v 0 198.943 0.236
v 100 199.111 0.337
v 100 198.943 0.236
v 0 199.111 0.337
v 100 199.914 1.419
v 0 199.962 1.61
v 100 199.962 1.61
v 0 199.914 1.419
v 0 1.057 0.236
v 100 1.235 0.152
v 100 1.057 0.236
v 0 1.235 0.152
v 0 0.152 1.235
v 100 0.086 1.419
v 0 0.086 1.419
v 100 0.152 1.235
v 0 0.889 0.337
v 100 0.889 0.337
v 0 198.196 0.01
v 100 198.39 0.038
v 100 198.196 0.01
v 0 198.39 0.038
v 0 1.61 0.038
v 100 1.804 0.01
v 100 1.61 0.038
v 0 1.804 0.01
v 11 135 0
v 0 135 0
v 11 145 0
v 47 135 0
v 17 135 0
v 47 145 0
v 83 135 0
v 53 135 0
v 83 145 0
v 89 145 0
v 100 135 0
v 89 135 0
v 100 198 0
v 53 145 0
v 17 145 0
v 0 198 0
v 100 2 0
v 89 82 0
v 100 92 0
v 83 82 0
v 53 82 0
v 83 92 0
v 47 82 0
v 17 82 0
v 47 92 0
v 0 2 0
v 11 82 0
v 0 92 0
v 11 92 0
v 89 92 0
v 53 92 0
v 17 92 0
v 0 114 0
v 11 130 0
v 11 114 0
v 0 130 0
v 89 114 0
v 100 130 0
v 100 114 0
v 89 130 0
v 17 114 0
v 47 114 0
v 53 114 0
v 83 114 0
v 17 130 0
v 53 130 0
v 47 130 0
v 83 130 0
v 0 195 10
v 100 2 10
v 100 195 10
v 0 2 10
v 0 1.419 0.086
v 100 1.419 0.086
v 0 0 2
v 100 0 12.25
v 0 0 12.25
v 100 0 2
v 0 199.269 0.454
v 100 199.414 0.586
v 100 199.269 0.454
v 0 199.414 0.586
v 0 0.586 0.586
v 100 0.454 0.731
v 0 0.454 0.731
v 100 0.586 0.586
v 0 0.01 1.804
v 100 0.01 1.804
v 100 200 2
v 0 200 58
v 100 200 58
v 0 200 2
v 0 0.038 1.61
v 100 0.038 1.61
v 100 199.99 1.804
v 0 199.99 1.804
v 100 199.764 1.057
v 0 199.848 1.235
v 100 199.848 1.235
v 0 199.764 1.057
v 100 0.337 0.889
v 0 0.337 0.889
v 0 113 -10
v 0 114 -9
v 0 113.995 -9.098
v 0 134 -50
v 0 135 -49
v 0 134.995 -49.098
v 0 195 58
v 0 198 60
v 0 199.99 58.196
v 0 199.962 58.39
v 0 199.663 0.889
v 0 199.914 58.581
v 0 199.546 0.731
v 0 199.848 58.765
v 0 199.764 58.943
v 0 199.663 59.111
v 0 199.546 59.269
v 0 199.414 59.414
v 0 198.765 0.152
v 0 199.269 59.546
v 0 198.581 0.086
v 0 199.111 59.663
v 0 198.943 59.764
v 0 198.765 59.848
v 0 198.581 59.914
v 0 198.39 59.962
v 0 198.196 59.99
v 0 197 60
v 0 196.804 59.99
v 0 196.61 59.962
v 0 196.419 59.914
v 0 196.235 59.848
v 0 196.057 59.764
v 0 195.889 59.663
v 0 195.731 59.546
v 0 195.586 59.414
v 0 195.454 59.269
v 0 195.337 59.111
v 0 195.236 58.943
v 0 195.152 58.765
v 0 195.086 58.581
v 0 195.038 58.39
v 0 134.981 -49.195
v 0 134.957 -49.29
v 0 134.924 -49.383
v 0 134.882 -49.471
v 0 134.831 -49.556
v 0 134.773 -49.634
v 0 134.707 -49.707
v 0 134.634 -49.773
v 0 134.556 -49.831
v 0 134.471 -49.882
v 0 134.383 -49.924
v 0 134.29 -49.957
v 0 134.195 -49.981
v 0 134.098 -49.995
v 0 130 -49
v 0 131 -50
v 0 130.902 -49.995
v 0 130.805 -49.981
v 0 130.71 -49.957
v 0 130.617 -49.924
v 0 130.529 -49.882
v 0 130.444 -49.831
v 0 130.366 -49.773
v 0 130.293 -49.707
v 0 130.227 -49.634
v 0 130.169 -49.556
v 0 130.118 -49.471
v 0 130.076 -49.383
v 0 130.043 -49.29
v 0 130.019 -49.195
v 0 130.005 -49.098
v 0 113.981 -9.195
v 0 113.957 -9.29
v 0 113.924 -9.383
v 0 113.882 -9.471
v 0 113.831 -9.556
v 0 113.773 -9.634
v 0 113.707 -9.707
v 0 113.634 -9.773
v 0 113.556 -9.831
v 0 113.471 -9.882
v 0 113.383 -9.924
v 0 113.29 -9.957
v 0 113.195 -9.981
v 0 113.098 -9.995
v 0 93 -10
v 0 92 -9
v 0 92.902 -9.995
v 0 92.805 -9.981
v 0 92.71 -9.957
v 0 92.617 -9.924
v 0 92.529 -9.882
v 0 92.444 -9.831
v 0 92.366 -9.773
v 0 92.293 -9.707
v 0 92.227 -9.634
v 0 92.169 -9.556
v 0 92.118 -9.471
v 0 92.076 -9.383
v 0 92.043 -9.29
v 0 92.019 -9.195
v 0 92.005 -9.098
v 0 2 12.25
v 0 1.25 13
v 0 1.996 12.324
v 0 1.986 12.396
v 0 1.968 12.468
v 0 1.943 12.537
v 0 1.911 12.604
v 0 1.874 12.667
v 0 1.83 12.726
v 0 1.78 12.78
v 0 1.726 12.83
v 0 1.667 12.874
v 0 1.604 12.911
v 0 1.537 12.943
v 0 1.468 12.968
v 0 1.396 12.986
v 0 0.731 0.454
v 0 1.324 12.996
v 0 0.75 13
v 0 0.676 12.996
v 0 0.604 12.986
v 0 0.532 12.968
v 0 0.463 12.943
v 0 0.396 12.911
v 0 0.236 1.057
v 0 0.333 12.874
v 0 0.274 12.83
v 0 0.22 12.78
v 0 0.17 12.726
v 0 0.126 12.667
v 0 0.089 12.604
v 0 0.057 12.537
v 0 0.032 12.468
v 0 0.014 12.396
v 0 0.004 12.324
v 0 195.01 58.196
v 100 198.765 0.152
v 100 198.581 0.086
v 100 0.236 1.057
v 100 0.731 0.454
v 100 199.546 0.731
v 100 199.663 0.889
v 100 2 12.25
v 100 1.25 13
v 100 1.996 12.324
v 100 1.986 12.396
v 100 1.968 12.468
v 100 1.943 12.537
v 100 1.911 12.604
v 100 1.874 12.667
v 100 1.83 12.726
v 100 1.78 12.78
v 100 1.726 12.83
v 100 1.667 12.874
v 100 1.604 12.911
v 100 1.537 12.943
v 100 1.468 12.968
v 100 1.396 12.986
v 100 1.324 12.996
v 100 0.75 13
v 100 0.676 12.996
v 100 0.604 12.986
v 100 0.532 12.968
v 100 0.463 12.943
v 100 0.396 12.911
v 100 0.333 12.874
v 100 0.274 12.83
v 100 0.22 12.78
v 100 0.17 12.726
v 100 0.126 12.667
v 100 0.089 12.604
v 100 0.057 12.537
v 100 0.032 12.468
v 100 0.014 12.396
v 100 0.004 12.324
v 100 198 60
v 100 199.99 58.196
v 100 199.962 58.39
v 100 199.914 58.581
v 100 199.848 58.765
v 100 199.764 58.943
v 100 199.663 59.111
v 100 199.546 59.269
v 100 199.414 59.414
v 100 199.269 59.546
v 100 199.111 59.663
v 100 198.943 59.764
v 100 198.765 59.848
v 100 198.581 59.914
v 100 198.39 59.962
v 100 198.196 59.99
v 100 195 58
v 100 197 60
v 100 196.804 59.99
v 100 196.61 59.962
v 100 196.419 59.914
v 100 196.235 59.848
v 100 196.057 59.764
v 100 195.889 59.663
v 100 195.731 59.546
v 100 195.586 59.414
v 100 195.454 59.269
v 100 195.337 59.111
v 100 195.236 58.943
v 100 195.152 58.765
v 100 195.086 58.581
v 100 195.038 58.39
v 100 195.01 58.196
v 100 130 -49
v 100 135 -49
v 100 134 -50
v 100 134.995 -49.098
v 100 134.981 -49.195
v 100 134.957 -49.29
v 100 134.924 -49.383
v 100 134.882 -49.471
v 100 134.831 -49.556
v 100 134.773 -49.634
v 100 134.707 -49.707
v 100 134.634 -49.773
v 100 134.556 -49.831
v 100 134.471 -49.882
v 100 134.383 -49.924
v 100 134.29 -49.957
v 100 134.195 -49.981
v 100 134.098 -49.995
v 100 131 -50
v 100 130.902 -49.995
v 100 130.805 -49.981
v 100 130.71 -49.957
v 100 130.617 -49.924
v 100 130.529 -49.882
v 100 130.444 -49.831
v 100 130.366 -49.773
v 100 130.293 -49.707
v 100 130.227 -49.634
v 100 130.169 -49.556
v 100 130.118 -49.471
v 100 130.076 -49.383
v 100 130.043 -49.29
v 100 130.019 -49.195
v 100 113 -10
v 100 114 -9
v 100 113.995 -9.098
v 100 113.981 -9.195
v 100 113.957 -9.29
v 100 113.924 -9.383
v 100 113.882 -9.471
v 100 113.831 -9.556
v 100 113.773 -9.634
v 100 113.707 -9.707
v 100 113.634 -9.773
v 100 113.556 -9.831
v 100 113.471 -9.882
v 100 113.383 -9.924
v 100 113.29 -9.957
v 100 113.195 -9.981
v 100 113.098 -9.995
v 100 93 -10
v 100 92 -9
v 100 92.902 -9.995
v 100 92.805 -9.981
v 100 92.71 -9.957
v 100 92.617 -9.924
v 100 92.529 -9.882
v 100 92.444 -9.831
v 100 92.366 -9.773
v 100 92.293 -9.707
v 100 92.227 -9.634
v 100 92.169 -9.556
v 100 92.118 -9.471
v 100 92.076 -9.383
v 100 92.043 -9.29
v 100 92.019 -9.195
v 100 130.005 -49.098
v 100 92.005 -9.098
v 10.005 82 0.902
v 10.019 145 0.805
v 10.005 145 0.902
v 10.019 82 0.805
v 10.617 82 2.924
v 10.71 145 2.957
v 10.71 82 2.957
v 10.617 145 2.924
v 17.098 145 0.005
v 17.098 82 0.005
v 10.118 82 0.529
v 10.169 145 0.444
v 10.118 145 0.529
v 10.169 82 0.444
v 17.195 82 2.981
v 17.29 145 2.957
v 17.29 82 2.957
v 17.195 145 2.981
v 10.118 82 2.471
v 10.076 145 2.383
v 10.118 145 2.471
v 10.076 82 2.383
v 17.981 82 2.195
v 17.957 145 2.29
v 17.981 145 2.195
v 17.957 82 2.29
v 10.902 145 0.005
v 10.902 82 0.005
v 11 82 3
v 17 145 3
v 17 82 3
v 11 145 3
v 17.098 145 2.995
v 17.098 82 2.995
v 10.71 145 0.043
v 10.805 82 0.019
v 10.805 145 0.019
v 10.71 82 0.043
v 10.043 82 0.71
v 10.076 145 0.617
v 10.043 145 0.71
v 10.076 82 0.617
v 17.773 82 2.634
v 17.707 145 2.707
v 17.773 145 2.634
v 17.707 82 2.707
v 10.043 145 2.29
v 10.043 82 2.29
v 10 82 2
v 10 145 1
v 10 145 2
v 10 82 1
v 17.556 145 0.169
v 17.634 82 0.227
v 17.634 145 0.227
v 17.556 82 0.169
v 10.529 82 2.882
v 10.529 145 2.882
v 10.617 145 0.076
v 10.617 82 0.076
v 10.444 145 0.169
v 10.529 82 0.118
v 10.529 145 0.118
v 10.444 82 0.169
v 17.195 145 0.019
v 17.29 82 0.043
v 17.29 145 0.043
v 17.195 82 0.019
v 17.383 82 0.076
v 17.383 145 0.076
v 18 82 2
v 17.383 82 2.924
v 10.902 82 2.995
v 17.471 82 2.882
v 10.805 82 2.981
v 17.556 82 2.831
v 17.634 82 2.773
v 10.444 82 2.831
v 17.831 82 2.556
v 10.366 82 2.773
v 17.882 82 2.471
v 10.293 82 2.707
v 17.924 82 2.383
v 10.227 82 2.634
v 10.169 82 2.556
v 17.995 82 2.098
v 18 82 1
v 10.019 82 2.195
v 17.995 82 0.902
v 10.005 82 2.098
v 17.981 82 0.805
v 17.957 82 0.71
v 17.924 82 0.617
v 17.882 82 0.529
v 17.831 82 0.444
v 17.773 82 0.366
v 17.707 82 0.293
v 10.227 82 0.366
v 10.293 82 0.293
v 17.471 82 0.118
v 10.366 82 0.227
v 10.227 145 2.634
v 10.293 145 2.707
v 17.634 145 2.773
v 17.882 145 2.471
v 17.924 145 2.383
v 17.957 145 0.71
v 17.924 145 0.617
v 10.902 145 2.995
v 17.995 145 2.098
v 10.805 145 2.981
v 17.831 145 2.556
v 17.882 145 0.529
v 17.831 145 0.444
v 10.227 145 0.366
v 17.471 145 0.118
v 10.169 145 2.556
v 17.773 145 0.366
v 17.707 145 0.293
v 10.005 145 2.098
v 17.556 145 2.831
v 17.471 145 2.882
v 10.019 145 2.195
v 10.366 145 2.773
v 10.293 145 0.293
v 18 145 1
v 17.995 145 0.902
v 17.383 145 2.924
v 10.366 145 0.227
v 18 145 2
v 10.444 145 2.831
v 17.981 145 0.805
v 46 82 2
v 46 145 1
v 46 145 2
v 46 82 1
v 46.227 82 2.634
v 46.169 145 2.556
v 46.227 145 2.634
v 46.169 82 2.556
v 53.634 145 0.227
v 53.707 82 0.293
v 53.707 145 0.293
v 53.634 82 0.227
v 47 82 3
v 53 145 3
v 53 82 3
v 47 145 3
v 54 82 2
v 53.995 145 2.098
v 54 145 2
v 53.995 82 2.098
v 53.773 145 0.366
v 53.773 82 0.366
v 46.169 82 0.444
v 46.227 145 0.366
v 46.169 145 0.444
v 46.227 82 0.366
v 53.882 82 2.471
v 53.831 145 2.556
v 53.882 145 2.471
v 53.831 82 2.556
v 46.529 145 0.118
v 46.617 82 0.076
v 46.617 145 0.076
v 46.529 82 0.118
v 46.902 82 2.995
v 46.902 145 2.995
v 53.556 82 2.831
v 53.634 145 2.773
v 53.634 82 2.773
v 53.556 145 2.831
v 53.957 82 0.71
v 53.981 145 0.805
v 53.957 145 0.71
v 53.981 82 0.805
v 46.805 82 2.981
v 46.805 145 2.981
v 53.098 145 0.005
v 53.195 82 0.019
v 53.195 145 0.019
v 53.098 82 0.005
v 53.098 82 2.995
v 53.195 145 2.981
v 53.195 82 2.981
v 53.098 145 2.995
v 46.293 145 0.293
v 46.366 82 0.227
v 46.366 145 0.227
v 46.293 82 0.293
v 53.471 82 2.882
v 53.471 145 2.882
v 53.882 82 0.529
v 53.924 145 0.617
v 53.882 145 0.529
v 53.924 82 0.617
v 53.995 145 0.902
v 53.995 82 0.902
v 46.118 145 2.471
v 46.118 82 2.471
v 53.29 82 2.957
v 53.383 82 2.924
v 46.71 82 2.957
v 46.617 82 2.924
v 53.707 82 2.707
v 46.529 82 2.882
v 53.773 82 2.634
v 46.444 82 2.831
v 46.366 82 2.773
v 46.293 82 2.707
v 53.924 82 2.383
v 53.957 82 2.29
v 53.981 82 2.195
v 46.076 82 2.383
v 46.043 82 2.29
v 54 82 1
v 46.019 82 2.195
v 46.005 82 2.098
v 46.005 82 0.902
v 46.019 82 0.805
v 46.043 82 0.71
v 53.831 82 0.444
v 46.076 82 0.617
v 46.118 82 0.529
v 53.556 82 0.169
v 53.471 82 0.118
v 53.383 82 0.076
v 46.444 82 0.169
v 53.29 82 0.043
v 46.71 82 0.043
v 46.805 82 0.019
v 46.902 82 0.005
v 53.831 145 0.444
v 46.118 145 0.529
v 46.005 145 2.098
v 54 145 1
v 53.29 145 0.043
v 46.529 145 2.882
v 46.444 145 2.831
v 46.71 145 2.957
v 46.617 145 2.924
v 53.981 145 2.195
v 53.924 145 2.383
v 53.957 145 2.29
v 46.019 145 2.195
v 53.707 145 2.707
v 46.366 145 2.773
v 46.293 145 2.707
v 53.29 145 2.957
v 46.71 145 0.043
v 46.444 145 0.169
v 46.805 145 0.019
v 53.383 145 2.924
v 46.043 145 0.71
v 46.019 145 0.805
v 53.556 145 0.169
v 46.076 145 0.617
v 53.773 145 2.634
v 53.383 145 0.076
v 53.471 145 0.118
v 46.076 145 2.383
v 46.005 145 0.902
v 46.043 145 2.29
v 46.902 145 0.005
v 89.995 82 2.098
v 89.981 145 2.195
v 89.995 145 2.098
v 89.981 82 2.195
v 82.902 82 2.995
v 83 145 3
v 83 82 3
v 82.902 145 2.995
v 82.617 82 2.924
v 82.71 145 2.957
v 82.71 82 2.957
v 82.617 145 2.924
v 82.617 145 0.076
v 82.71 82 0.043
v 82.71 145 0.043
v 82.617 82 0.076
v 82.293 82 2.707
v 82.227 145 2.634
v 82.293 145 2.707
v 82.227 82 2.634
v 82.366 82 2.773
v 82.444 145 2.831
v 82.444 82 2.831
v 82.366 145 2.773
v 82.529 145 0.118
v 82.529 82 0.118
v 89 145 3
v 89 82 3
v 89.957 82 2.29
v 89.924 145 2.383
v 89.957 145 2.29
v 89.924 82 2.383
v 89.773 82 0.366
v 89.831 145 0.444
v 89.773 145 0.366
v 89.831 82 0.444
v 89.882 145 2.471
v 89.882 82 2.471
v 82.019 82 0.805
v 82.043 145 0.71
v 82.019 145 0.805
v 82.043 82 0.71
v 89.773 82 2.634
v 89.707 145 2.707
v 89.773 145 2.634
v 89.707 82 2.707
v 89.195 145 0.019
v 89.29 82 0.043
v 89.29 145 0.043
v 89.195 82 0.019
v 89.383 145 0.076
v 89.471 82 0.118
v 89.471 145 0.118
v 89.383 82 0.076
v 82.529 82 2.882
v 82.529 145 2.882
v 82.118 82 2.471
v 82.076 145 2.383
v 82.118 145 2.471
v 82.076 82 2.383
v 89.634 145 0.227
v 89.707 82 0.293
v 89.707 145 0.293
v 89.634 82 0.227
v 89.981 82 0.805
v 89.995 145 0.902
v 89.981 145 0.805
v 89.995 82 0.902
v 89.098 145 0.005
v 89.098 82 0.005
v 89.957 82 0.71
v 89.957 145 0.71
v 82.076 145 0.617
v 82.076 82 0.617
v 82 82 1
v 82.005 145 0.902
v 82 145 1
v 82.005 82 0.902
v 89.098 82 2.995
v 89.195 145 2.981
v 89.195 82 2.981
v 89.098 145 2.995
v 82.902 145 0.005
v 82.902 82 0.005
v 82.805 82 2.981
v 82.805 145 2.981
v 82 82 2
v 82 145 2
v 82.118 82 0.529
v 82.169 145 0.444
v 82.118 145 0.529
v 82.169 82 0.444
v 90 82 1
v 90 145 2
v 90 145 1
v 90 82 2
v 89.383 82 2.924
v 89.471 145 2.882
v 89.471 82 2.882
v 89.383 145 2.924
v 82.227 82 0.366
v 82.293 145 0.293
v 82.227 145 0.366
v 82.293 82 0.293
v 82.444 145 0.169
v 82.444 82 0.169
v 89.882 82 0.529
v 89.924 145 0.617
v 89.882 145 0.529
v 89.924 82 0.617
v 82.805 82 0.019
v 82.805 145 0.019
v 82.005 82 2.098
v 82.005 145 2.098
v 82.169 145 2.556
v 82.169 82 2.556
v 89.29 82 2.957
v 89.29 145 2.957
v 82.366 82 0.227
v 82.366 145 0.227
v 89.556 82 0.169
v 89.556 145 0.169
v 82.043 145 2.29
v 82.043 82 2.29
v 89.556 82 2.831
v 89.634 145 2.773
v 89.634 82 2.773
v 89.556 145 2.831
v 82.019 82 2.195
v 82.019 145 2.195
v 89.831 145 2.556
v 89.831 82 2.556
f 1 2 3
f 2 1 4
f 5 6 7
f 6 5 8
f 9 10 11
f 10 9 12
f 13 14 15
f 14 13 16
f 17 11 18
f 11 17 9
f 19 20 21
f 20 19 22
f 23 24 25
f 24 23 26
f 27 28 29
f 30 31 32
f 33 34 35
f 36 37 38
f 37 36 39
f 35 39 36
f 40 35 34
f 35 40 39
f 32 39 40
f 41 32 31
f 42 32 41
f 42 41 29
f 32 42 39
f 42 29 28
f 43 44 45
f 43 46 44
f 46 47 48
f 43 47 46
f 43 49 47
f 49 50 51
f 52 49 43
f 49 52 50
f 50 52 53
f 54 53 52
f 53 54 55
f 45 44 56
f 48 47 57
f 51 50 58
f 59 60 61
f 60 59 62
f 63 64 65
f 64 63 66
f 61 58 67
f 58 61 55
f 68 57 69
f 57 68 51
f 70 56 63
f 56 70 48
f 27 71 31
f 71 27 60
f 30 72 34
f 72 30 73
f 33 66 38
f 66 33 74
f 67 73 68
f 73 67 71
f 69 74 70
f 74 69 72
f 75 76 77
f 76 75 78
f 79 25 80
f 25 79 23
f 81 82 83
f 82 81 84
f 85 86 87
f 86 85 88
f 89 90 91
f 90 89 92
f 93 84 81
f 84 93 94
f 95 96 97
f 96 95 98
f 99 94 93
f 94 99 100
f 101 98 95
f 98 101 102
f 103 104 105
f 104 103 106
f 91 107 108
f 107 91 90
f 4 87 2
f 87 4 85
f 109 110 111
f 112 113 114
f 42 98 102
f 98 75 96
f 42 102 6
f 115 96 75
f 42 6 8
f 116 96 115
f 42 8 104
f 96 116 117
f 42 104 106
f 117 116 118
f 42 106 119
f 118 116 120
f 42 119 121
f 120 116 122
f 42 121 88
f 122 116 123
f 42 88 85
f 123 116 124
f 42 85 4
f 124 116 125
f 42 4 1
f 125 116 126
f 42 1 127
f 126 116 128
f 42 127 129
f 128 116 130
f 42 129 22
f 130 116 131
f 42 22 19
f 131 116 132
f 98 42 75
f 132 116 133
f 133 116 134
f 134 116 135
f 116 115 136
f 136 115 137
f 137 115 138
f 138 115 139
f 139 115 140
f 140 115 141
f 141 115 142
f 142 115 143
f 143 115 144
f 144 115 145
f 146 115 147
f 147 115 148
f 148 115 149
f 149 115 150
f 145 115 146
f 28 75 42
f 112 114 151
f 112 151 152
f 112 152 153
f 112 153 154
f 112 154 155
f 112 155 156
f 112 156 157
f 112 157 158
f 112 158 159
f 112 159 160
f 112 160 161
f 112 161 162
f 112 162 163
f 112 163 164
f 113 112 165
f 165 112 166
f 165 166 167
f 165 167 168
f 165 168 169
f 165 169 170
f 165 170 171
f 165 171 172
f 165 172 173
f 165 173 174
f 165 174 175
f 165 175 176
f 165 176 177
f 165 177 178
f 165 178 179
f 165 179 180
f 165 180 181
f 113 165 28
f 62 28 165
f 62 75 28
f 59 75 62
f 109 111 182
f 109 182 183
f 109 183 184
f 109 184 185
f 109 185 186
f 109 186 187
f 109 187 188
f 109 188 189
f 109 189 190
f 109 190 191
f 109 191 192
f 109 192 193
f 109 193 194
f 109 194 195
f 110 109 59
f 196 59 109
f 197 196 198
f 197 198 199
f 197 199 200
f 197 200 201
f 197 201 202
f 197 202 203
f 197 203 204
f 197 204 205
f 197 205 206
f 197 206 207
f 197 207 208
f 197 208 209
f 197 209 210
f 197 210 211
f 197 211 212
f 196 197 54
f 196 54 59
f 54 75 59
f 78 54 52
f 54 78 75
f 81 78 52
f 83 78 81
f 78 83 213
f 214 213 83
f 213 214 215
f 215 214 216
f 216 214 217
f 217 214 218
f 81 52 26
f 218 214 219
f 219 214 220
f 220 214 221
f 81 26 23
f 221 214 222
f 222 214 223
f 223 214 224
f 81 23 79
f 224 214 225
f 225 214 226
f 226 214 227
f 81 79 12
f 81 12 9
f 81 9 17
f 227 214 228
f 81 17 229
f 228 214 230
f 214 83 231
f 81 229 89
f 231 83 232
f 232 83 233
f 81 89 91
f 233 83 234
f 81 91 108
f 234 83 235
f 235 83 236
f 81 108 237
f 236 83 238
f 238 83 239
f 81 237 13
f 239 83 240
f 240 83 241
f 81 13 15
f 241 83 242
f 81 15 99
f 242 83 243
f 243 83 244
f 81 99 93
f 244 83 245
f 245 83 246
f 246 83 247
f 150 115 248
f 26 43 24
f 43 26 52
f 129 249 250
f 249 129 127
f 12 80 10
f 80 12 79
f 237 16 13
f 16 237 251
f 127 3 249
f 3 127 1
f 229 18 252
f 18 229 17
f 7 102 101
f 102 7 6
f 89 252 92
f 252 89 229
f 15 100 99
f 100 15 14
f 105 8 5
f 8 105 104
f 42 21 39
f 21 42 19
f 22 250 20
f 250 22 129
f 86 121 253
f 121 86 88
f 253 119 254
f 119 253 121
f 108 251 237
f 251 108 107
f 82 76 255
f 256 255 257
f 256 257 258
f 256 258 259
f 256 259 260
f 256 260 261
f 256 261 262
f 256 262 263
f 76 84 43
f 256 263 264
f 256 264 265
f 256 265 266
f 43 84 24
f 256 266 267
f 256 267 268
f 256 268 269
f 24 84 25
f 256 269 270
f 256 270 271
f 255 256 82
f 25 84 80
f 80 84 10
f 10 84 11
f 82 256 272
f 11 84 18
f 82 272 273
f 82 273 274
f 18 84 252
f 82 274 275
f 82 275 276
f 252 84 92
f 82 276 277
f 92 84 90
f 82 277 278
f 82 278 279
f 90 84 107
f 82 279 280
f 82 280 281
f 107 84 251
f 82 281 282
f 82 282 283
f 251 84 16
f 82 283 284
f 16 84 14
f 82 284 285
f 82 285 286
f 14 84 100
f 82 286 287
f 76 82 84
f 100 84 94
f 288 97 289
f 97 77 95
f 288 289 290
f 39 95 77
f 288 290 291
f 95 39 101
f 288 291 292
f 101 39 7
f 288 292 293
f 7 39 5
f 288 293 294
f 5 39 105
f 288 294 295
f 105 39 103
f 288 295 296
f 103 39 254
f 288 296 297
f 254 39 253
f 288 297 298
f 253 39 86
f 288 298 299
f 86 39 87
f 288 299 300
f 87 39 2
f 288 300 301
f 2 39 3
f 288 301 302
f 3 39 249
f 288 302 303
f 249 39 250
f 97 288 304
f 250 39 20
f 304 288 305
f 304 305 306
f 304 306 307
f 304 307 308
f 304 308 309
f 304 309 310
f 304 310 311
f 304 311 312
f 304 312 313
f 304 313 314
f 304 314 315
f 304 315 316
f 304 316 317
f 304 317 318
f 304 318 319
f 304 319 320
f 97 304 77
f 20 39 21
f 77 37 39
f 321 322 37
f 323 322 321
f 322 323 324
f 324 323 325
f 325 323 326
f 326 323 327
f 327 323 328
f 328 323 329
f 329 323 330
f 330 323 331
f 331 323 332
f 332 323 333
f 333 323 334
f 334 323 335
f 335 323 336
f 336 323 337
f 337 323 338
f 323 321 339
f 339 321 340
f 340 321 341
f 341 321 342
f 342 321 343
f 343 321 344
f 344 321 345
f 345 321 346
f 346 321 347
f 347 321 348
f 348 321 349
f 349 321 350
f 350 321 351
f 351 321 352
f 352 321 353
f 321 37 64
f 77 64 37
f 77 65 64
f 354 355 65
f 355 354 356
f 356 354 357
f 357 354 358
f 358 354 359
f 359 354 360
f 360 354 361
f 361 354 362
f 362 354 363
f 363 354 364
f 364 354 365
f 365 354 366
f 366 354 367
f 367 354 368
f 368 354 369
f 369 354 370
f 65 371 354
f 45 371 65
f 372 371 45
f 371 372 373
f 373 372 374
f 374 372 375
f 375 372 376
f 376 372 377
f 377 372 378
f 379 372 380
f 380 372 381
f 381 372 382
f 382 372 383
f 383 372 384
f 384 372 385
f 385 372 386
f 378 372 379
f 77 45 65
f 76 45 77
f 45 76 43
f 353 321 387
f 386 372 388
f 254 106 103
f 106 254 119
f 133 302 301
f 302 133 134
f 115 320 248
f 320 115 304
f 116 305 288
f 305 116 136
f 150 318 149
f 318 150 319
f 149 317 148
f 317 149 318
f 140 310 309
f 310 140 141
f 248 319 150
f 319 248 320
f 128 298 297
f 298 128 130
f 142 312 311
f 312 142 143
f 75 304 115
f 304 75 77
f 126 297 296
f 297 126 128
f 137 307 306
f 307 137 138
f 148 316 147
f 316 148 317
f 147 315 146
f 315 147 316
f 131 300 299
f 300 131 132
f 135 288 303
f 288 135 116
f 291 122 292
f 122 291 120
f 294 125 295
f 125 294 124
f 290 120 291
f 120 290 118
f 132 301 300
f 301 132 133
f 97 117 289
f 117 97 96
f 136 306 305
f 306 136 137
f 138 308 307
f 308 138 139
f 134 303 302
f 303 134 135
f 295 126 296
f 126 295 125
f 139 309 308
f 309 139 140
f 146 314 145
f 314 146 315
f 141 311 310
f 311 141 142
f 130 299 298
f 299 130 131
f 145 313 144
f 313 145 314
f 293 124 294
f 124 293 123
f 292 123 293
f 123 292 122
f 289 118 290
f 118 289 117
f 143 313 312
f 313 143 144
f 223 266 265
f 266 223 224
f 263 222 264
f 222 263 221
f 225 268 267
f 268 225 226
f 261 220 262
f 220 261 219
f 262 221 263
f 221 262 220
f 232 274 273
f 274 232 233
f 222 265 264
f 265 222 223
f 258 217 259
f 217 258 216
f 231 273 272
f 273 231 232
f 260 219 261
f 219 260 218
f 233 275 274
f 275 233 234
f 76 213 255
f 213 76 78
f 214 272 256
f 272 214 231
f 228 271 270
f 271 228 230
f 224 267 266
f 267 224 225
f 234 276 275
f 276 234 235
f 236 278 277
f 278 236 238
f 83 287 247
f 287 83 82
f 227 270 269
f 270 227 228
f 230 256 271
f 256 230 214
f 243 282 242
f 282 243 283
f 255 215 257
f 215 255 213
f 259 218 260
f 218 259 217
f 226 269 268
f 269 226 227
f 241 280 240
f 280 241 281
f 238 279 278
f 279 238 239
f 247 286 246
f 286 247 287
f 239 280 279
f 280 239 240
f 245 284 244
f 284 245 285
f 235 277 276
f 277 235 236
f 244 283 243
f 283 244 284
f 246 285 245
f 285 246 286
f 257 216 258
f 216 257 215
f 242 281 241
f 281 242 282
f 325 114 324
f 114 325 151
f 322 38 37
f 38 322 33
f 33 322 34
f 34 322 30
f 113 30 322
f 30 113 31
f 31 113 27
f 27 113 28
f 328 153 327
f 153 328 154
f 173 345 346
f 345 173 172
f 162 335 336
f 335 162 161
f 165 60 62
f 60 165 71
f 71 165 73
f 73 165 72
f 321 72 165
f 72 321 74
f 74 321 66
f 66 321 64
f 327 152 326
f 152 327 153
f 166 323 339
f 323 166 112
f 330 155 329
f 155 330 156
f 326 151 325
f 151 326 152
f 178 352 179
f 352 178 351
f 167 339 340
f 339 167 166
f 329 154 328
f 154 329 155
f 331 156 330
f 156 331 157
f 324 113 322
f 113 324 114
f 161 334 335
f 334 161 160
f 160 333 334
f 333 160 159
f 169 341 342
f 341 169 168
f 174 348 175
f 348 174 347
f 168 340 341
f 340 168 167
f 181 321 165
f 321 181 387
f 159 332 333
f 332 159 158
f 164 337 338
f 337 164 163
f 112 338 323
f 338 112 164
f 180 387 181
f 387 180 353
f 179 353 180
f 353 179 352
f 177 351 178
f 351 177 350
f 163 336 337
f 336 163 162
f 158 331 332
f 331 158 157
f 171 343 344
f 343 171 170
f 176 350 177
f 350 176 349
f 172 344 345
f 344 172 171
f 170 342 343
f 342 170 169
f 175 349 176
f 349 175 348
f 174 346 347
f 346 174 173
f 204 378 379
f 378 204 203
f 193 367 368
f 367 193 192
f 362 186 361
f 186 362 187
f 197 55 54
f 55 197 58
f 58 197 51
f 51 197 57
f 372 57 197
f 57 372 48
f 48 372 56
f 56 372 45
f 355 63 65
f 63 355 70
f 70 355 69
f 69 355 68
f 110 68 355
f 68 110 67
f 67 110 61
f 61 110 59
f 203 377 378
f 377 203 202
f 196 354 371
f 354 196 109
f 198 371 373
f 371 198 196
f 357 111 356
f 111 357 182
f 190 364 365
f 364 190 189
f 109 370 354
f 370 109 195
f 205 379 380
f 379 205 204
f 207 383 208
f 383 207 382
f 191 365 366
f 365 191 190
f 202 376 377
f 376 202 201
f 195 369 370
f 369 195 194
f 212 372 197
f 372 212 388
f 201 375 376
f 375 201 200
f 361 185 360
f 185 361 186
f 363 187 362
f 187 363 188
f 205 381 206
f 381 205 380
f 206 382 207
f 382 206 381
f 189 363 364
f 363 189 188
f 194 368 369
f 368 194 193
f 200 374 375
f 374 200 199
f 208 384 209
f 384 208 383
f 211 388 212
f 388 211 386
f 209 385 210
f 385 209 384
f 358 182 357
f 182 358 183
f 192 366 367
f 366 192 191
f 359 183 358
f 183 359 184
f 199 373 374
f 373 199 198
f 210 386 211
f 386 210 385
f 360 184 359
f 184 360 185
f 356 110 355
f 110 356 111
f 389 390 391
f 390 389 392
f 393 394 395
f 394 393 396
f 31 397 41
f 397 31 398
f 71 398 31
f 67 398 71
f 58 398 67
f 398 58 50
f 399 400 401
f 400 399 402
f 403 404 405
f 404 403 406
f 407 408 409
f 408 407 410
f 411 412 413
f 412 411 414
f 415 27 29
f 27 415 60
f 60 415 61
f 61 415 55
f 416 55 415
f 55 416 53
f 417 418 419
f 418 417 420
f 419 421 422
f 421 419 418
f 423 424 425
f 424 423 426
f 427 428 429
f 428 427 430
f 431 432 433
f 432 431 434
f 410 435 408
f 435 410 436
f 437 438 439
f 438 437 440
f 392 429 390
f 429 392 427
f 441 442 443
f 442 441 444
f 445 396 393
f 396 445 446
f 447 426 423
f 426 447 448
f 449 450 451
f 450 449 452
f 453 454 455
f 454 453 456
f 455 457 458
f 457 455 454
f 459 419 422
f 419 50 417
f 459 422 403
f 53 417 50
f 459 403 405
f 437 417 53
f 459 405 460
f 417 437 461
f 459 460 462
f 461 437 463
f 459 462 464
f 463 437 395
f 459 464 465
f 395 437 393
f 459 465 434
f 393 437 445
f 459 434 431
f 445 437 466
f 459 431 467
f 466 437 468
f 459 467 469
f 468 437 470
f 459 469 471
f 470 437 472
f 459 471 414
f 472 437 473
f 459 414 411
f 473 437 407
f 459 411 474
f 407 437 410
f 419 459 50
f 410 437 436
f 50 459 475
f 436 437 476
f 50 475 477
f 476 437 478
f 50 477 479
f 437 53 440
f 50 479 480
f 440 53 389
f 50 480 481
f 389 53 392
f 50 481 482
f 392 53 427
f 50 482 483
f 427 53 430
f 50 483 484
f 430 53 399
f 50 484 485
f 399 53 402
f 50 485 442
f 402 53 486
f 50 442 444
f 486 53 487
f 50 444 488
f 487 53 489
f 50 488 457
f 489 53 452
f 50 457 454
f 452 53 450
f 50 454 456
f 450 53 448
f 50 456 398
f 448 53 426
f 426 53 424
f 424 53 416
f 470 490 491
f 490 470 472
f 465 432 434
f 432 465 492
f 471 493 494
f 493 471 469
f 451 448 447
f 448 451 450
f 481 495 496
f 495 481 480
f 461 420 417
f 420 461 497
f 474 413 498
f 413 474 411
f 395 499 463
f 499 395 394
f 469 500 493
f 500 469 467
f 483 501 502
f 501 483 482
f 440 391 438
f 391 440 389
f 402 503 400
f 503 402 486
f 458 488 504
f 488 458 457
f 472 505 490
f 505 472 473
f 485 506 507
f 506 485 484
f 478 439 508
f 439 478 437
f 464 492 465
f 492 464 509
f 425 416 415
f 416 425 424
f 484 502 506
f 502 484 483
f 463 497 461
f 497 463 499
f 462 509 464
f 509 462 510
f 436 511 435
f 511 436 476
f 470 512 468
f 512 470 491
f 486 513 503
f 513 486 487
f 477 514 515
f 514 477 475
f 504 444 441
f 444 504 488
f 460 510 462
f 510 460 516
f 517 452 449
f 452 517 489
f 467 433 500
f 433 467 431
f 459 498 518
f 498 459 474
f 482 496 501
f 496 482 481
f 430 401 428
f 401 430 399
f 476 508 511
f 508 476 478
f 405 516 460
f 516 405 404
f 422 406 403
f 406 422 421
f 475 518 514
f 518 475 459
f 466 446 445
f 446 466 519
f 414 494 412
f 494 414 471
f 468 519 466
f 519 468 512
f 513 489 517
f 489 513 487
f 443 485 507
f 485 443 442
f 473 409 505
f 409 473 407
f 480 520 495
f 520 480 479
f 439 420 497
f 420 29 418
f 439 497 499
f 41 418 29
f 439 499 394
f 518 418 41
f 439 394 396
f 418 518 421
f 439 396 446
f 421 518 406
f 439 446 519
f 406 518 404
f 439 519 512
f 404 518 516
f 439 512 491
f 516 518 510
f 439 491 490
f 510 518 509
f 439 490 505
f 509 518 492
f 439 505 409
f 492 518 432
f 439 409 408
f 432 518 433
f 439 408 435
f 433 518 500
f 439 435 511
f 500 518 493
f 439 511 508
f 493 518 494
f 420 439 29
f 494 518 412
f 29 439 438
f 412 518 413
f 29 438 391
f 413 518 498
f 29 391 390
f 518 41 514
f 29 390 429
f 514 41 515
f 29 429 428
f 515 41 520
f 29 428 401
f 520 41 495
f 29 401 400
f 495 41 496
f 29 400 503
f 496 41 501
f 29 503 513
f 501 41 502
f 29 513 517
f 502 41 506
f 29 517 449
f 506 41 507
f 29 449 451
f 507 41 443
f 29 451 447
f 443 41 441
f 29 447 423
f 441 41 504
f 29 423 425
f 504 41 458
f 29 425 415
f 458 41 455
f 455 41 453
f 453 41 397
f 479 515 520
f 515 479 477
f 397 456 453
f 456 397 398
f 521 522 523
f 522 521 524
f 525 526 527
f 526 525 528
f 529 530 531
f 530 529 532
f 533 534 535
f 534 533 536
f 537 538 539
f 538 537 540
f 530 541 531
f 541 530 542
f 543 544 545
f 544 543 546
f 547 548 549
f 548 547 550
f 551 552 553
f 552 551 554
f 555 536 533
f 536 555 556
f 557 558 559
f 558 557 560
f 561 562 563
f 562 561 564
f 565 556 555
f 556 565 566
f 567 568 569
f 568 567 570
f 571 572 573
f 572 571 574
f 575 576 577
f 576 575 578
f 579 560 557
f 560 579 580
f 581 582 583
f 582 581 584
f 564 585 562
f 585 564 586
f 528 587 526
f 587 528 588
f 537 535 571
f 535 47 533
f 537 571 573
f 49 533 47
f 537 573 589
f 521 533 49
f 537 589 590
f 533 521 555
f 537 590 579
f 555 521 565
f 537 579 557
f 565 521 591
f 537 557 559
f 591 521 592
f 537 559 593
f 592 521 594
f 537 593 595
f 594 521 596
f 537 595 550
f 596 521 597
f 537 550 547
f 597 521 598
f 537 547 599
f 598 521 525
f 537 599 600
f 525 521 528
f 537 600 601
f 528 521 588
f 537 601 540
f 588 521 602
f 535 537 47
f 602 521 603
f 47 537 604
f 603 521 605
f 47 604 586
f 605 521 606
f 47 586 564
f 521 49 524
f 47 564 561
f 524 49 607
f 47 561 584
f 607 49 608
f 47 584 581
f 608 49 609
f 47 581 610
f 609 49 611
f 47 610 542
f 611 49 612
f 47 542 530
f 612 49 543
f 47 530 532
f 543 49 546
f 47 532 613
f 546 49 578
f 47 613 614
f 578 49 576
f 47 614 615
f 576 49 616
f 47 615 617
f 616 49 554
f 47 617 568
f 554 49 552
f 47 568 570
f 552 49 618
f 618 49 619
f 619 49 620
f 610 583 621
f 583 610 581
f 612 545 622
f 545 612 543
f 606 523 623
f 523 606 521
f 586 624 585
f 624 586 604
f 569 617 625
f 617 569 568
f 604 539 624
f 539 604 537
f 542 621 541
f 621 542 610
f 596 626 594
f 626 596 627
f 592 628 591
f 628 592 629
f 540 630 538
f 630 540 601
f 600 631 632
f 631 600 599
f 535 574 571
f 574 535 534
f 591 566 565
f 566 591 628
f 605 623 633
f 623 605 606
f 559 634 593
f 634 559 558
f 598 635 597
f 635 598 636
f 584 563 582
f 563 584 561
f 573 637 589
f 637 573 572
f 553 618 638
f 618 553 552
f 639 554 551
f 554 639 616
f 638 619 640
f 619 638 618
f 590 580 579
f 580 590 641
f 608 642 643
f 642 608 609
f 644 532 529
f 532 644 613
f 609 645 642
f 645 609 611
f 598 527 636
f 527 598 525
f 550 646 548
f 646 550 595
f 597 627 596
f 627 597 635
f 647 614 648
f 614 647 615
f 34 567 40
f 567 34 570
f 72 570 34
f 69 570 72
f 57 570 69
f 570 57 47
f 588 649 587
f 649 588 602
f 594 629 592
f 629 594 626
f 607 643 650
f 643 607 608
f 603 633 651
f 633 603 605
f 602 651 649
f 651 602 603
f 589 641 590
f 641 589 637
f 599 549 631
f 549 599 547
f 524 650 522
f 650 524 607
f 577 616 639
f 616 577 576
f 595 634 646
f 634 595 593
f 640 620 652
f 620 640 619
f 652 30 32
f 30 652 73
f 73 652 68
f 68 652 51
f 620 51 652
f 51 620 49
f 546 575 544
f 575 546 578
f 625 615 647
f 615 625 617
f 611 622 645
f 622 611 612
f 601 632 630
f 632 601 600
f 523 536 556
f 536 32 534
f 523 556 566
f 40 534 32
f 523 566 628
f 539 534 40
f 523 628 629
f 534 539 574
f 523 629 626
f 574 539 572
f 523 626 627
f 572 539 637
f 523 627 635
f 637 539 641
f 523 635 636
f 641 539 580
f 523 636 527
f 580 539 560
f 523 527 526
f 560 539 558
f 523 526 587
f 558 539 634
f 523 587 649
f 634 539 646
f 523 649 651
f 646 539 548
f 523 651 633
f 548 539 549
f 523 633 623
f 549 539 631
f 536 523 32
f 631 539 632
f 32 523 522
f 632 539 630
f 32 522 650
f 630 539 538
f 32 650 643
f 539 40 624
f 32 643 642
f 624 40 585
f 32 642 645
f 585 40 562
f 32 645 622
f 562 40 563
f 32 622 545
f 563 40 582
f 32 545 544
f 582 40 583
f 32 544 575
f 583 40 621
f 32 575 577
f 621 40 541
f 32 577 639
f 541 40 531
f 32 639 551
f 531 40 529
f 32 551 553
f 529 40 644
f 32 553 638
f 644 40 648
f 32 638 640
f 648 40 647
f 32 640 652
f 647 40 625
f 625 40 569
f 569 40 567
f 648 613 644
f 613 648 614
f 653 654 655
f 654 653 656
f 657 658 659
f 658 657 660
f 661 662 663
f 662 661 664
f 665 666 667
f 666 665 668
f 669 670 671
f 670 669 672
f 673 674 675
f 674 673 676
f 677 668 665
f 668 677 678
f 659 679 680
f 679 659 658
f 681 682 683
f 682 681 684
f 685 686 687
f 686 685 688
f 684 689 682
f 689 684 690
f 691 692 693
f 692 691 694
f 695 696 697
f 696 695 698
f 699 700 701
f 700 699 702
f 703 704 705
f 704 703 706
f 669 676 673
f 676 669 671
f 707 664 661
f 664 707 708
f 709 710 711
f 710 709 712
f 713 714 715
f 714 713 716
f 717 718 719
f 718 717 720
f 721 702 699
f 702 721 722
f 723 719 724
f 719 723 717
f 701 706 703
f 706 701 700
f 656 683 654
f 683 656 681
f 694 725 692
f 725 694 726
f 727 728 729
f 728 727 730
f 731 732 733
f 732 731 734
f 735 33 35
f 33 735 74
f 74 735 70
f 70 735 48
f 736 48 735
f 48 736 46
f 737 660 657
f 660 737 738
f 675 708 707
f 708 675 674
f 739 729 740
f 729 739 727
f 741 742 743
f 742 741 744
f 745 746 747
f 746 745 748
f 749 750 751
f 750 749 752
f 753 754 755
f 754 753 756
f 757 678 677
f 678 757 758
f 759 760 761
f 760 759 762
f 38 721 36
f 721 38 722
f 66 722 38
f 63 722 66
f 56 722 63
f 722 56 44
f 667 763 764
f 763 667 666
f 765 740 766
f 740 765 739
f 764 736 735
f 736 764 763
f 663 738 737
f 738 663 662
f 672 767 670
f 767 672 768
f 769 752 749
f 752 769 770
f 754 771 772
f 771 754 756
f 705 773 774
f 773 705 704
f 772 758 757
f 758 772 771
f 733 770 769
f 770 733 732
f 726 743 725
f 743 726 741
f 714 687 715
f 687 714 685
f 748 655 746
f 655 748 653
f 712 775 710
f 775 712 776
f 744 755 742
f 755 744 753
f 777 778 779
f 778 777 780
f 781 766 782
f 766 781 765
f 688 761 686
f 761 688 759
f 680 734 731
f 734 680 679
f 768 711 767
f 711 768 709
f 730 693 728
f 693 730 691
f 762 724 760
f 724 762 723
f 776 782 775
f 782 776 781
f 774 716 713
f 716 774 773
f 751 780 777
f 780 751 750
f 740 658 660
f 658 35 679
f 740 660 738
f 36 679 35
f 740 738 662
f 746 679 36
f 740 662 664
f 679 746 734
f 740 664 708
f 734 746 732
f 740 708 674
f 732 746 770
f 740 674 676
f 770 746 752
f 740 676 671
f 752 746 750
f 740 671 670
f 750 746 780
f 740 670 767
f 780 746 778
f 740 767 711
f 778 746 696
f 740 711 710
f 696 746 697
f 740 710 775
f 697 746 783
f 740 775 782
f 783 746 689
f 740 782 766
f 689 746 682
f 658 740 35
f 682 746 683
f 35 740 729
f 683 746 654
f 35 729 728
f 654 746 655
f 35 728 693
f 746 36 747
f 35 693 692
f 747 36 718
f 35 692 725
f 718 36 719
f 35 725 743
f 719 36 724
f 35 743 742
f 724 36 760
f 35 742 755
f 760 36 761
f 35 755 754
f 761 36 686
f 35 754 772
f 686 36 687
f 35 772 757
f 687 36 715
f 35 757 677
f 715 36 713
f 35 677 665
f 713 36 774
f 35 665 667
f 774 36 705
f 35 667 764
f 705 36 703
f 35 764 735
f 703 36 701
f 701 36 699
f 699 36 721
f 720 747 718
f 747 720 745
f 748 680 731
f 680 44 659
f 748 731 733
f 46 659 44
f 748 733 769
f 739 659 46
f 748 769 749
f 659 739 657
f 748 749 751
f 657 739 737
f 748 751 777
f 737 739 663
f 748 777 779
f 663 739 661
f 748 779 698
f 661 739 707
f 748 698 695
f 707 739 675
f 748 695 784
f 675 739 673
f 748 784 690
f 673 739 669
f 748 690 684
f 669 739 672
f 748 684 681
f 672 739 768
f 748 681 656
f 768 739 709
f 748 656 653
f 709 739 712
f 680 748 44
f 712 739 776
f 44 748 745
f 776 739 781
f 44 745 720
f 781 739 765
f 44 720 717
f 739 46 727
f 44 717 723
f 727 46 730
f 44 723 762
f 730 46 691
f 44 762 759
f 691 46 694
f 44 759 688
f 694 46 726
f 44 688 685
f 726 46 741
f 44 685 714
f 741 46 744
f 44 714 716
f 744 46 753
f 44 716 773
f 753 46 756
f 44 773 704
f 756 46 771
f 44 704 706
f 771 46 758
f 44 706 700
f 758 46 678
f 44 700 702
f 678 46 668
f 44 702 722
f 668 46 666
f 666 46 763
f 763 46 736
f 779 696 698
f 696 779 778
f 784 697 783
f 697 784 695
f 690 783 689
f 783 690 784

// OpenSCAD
// 100mm-wide × 200mm-deep bar shelf — see bar_shelf.scad for the design.
shelf_width_override = 100;
shelf_depth_override = 200;
include <bar_shelf.scad>
